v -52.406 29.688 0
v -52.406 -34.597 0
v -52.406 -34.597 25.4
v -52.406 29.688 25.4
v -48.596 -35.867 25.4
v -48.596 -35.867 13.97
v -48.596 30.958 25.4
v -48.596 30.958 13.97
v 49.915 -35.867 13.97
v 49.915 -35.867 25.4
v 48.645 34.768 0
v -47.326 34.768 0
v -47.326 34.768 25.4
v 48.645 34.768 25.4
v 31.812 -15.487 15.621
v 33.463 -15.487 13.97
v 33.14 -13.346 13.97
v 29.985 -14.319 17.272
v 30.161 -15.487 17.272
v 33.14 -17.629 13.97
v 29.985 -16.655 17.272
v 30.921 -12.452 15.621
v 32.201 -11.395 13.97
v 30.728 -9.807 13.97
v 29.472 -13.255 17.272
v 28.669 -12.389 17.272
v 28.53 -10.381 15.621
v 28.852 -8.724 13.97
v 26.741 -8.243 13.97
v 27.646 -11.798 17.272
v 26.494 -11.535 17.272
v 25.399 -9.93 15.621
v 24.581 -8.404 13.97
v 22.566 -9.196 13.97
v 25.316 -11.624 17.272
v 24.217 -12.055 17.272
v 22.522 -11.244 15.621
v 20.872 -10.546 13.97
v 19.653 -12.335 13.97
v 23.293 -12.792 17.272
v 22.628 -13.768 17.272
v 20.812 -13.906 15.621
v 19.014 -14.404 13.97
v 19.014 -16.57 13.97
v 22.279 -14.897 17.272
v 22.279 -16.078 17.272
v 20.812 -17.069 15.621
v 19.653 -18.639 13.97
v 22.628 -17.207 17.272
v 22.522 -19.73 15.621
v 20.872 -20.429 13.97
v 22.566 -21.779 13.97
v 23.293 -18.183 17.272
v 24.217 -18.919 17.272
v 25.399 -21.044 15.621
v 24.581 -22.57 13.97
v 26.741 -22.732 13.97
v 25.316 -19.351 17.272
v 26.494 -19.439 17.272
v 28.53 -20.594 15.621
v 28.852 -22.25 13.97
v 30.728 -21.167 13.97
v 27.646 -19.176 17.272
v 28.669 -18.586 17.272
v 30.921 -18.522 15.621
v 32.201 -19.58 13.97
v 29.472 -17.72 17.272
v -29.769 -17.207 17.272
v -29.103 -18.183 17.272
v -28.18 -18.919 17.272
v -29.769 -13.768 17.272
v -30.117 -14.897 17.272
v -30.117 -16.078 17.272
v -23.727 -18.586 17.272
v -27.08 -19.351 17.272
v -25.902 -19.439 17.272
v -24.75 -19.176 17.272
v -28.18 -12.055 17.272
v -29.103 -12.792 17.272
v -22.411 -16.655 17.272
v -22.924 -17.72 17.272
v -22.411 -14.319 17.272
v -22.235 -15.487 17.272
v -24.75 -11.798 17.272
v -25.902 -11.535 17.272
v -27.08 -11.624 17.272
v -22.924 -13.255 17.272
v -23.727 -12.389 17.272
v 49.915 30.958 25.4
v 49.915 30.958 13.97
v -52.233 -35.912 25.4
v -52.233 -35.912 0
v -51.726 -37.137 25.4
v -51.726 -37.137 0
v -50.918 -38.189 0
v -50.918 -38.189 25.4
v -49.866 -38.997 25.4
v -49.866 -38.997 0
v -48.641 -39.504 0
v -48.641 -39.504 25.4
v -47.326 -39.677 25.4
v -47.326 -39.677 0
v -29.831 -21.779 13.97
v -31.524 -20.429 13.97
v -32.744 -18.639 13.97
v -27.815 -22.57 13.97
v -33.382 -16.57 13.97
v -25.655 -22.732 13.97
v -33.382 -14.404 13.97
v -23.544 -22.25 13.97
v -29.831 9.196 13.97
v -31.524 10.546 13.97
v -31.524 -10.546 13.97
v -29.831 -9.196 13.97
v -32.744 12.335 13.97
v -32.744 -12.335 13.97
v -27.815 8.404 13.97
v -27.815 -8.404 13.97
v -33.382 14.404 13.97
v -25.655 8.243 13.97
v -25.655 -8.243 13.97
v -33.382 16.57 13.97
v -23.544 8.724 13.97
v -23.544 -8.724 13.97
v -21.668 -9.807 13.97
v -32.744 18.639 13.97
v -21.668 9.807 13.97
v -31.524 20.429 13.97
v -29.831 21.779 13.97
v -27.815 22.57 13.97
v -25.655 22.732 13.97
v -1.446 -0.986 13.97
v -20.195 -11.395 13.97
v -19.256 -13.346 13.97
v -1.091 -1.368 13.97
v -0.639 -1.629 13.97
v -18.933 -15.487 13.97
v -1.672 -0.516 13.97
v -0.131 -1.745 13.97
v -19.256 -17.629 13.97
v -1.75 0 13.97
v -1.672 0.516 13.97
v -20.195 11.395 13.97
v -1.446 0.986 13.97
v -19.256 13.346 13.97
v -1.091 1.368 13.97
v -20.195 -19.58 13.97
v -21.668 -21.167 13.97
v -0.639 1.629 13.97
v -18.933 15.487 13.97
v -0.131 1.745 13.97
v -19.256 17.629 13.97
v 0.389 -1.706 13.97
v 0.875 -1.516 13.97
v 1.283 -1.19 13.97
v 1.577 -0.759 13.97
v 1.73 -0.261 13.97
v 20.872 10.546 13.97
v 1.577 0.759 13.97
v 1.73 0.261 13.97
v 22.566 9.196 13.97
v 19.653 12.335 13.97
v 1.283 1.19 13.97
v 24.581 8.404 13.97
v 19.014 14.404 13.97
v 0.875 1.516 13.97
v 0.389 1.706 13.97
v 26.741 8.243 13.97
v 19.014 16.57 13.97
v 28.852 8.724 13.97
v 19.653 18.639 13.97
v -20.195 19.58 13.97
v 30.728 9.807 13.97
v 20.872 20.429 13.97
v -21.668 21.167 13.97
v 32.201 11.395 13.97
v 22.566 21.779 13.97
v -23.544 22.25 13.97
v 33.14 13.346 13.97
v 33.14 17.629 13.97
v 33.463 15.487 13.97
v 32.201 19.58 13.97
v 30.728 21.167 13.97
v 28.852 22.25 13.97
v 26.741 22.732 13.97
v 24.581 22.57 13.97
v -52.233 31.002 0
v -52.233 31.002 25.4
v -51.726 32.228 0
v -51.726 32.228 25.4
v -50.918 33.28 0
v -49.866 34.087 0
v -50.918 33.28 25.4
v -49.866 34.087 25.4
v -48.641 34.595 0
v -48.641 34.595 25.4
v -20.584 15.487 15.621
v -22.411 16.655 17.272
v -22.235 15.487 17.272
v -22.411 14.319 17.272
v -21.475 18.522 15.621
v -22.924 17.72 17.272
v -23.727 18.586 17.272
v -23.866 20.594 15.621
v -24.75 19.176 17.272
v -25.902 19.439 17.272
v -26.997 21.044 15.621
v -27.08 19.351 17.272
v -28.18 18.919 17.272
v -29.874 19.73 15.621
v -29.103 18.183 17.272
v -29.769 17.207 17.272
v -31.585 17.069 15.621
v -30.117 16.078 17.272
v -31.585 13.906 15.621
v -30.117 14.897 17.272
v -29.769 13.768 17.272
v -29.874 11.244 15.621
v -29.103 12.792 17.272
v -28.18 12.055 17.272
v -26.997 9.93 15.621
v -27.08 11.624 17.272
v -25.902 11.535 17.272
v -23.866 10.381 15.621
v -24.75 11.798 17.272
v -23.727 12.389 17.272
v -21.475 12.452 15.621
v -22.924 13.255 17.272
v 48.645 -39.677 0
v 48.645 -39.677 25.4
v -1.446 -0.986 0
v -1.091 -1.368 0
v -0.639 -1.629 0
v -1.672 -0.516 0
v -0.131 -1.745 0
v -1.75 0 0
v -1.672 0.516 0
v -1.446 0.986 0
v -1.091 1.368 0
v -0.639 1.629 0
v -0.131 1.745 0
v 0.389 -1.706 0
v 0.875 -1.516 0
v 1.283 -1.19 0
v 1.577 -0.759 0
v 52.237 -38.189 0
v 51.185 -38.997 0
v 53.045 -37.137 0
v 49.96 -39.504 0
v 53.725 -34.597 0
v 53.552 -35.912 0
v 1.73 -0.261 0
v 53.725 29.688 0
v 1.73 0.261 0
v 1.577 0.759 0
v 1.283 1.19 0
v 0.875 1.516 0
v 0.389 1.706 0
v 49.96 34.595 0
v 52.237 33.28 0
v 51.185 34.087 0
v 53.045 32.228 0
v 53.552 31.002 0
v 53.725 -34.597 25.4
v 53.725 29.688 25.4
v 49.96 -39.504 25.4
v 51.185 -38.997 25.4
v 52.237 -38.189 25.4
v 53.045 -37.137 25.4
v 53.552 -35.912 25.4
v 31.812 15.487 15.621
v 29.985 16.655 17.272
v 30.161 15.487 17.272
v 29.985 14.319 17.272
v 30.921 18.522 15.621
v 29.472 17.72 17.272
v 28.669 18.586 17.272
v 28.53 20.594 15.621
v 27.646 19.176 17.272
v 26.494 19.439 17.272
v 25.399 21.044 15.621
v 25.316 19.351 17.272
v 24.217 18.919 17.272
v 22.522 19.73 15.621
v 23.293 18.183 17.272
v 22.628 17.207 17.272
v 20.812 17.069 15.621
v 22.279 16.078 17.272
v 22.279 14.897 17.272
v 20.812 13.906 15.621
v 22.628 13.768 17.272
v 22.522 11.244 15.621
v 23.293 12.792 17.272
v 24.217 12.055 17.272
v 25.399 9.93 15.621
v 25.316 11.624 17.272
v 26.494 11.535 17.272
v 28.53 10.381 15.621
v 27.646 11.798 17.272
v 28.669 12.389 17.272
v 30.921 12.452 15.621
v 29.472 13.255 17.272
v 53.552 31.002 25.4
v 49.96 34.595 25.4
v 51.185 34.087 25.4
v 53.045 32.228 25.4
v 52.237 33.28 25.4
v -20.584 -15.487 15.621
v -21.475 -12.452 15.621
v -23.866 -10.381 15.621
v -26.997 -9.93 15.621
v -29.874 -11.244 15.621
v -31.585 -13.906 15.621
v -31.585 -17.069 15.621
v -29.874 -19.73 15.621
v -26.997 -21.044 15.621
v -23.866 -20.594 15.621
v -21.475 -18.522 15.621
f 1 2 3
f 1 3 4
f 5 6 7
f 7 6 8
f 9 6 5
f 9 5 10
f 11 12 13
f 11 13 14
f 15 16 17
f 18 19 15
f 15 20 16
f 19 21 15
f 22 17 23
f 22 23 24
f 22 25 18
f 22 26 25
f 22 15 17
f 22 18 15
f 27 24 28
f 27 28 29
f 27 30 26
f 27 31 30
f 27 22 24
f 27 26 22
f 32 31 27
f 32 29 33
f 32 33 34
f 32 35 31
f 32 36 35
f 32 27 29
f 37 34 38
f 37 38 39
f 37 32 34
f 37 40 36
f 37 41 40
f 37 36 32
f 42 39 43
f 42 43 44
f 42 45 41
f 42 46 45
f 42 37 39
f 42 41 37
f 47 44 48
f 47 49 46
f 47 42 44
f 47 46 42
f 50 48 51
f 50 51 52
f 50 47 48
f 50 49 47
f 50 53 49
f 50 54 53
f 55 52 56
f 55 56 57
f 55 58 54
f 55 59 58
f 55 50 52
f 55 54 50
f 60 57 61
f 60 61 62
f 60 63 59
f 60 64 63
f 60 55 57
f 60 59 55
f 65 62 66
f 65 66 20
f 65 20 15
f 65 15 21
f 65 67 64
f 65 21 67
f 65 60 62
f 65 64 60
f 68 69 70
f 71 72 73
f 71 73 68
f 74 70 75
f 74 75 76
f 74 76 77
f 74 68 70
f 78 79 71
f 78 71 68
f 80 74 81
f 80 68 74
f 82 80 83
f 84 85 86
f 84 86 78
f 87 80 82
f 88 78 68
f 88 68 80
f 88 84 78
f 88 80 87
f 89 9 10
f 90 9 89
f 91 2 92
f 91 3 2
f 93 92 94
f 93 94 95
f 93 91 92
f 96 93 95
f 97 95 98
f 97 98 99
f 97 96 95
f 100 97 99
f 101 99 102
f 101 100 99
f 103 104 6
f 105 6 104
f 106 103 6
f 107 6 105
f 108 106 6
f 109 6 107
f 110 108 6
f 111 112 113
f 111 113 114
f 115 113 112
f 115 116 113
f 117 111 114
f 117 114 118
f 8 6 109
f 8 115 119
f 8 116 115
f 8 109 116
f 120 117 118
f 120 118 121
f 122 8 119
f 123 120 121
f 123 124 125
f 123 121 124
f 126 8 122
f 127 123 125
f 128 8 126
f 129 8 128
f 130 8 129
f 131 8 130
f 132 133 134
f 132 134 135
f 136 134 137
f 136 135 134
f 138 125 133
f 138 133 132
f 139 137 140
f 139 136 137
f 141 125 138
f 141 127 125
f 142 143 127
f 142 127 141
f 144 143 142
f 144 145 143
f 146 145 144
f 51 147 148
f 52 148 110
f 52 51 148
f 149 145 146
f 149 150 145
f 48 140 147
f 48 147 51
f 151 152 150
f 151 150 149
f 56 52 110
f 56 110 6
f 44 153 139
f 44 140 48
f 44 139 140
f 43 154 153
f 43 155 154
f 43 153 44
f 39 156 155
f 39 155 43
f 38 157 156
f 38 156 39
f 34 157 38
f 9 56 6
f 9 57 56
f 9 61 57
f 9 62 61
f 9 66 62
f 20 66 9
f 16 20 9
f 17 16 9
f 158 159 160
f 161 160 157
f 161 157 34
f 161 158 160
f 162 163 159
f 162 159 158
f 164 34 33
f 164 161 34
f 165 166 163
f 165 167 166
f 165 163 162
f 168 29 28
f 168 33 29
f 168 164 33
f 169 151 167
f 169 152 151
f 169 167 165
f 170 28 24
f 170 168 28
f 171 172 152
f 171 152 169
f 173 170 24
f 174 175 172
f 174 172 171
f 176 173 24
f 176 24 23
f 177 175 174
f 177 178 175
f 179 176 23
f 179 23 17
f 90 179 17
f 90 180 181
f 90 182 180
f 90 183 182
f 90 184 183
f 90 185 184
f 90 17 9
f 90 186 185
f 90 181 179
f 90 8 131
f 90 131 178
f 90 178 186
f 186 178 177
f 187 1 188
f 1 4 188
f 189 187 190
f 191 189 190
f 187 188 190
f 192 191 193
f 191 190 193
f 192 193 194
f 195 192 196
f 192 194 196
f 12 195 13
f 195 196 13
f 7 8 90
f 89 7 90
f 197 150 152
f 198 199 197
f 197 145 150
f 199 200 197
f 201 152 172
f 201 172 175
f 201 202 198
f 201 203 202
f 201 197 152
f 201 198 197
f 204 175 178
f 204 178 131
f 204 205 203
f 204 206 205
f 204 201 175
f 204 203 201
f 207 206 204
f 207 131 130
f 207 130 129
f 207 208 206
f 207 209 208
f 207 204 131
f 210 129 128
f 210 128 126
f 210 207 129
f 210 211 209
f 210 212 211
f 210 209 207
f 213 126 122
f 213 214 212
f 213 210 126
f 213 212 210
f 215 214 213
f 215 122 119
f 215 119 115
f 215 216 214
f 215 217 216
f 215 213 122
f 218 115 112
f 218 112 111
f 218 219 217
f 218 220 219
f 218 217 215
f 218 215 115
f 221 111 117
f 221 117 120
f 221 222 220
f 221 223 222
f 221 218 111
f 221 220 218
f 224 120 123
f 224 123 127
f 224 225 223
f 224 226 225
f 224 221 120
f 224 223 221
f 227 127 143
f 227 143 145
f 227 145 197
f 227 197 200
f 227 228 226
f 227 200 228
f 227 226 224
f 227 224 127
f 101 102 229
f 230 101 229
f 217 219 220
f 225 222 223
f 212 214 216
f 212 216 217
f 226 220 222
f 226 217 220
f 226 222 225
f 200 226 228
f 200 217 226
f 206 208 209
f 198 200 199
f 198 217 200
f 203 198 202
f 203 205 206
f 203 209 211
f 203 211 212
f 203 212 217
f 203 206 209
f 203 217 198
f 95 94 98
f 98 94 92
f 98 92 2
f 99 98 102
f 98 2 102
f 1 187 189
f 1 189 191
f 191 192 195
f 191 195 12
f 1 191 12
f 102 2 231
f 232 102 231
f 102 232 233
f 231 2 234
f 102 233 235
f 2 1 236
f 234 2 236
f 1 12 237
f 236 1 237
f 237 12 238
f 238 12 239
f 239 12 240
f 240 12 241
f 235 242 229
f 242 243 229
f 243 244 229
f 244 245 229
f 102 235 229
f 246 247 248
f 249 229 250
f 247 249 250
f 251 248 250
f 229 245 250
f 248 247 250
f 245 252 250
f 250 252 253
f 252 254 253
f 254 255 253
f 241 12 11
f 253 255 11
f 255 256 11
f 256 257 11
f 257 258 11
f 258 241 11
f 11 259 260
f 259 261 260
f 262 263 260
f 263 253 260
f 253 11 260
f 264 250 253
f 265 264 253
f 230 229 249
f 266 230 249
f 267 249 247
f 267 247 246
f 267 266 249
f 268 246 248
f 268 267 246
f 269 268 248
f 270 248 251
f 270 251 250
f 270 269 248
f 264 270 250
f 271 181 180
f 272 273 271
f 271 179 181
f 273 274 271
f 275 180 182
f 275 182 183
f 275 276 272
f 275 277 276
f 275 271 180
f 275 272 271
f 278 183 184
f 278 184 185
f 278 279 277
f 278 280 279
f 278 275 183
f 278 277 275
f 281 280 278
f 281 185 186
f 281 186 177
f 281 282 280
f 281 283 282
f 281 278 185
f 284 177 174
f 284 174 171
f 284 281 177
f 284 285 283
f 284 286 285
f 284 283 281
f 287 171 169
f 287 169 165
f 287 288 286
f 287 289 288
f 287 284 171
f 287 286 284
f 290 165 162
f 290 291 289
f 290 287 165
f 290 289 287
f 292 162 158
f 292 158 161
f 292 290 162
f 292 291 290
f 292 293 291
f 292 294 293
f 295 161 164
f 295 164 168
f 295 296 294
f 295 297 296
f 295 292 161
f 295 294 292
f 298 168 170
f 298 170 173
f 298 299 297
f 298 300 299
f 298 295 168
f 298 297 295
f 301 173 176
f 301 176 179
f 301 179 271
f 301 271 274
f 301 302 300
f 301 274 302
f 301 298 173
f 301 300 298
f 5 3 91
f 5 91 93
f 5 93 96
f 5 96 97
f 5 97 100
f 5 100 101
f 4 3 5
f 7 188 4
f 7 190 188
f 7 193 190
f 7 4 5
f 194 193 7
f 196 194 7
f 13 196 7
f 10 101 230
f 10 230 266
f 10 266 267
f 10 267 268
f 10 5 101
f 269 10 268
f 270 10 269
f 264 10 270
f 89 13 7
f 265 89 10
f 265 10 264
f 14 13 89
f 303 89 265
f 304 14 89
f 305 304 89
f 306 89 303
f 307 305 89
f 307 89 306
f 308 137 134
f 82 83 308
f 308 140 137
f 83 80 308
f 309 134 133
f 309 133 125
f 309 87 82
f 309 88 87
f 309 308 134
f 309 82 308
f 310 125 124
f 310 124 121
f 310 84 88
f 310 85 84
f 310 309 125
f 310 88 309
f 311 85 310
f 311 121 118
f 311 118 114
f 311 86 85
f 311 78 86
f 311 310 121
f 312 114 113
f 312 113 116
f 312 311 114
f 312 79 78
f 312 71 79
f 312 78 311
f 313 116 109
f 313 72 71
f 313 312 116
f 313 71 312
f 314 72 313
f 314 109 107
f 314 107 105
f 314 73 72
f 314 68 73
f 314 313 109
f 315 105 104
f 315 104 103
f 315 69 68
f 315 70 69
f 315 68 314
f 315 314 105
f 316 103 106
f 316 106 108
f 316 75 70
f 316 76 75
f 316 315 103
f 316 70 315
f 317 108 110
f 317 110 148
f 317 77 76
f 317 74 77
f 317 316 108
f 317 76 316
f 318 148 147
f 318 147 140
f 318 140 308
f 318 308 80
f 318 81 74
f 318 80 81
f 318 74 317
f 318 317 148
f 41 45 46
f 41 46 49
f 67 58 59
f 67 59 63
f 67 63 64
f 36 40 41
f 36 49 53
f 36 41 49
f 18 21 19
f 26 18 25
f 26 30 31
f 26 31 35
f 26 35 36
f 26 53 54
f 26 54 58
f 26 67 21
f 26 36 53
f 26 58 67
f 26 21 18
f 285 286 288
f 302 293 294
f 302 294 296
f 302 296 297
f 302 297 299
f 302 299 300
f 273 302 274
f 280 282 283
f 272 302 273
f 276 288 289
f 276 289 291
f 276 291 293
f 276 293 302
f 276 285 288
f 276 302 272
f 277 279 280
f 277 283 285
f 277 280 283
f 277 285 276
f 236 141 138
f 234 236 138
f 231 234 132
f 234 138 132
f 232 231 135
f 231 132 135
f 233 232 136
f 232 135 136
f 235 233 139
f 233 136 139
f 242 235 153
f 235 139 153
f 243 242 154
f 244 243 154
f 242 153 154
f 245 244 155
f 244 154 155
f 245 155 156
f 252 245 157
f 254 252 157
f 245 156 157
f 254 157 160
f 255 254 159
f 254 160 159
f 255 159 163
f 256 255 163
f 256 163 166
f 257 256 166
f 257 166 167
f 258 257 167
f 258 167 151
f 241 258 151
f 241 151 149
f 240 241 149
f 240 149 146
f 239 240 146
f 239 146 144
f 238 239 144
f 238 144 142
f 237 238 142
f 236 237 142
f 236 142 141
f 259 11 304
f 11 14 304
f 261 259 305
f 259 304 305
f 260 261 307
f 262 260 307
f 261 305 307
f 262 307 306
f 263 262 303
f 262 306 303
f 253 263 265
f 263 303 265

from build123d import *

# Parameters (mm, degrees)
F0_W     = 106.1315912282
F0_H     = 74.4450837374
F0_W_2   = 98.5115912282
F0_H_2   = 66.8250837374
F1_DEPTH = 25.4
F0_R     = 9.0429354427
F2_DEPTH = 13.97
F3_DEPTH = 17.272
F4_D     = 3.5
F6_R     = 5.08


# Not quite as in the source:
# - a fillet or chamfer that OpenCascade refuses, or shapes differently, is made with other operations: its cross-section is extruded or revolved along the edge and cut away or added


with BuildPart() as f1:
    # F0 (on Top) → F1 (new body)
    with BuildSketch(Plane.XY):
        with Locations((0.6595404583, -2.4548470974)):
            Rectangle(F0_W, F0_H)
        with Locations((0.6595404583, -2.4548470974)):
            Rectangle(F0_W_2, F0_H_2, mode=Mode.SUBTRACT)
    extrude(amount=F1_DEPTH)

    # F0 (on Top) → F2 (join)
    with BuildSketch(Plane.XY):
        with Locations((0.6595404583, -2.4548470974)):
            Rectangle(F0_W_2, F0_H_2)
        with Locations((-26.1980332434, -15.4872145504)):
            Circle(F0_R, mode=Mode.SUBTRACT)
        with Locations((26.1980332434, -15.4872145504)):
            Circle(F0_R, mode=Mode.SUBTRACT)
        with Locations((-26.1980332434, 15.4872145504)):
            Circle(F0_R, mode=Mode.SUBTRACT)
        with Locations((26.1980332434, 15.4872145504)):
            Circle(F0_R, mode=Mode.SUBTRACT)
    extrude(amount=F2_DEPTH)

    # F0 (on Top) → F3 (join)
    with BuildSketch(Plane.XY):
        with Locations((-26.1980332434, -15.4872145504)):
            Circle(F0_R)
        with Locations((-26.1980332434, 15.4872145504)):
            Circle(F0_R)
        with Locations((26.1980332434, 15.4872145504)):
            Circle(F0_R)
        with Locations((26.1980332434, -15.4872145504)):
            Circle(F0_R)
    extrude(amount=F3_DEPTH)

    # F4 (through all)
    with Locations(Plane(origin=(0, 0, 0), x_dir=(1, 0, 0), z_dir=(0, 0, -1))):
        with Locations((0, 0)):
            Hole(F4_D / 2)

    # F5: chamfer of 5.08 on 4 edges, made by hand


with BuildPart() as f5_tool2:
    # F5_s3 → F5_t4 (revolve)
    with BuildSketch(Plane.XZ.offset(-15.4872145504)):
        Polygon((-17.1550978007, 12.192), (-22.2350978007, 17.272), (-17.1550978007, 17.272), align=None)
    revolve(axis=Axis((-26.1980332434, 15.4872145504, 17.272), (0, 0, 1)))

    split(bisect_by=Plane.XY.offset(13.97), keep=Keep.TOP)


with BuildPart() as f1_1:
    add(f1.part)

    # F5_t1: cut F5_tool2
    add(f5_tool2.part, mode=Mode.SUBTRACT)


with BuildPart() as f5_tool7:
    # F5_s8 → F5_t9 (revolve)
    with BuildSketch(Plane.XZ.offset(-15.4872145504)):
        Polygon((35.2409686861, 12.192), (30.1609686861, 17.272), (35.2409686861, 17.272), align=None)
    revolve(axis=Axis((26.1980332434, 15.4872145504, 17.272), (0, 0, 1)))

    split(bisect_by=Plane.XY.offset(13.97), keep=Keep.TOP)


with BuildPart() as f1_2:
    add(f1_1.part)

    # F5_t6: cut F5_tool7
    add(f5_tool7.part, mode=Mode.SUBTRACT)


with BuildPart() as f5_tool12:
    # F5_s13 → F5_t14 (revolve)
    with BuildSketch(Plane.XZ.offset(15.4872145504)):
        Polygon((35.2409686861, 12.192), (30.1609686861, 17.272), (35.2409686861, 17.272), align=None)
    revolve(axis=Axis((26.1980332434, -15.4872145504, 17.272), (0, 0, 1)))

    split(bisect_by=Plane.XY.offset(13.97), keep=Keep.TOP)


with BuildPart() as f1_3:
    add(f1_2.part)

    # F5_t11: cut F5_tool12
    add(f5_tool12.part, mode=Mode.SUBTRACT)


with BuildPart() as f5_tool17:
    # F5_s18 → F5_t19 (revolve)
    with BuildSketch(Plane.XZ.offset(15.4872145504)):
        Polygon((-17.1550978007, 12.192), (-22.2350978007, 17.272), (-17.1550978007, 17.272), align=None)
    revolve(axis=Axis((-26.1980332434, -15.4872145504, 17.272), (0, 0, 1)))

    split(bisect_by=Plane.XY.offset(13.97), keep=Keep.TOP)


with BuildPart() as f1_4:
    add(f1_3.part)

    # F5_t16: cut F5_tool17
    add(f5_tool17.part, mode=Mode.SUBTRACT)

    # F6
    f6_edges = [f1_4.edges().sort_by_distance(p)[0] for p in [
        (-52.406255, -39.677389, 12.7),
        (-52.406255, 34.767695, 12.7),
        (53.725336, -39.677389, 12.7),
        (53.725336, 34.767695, 12.7),
    ]]
    fillet(f6_edges, radius=F6_R)


solid = f1_4.part
